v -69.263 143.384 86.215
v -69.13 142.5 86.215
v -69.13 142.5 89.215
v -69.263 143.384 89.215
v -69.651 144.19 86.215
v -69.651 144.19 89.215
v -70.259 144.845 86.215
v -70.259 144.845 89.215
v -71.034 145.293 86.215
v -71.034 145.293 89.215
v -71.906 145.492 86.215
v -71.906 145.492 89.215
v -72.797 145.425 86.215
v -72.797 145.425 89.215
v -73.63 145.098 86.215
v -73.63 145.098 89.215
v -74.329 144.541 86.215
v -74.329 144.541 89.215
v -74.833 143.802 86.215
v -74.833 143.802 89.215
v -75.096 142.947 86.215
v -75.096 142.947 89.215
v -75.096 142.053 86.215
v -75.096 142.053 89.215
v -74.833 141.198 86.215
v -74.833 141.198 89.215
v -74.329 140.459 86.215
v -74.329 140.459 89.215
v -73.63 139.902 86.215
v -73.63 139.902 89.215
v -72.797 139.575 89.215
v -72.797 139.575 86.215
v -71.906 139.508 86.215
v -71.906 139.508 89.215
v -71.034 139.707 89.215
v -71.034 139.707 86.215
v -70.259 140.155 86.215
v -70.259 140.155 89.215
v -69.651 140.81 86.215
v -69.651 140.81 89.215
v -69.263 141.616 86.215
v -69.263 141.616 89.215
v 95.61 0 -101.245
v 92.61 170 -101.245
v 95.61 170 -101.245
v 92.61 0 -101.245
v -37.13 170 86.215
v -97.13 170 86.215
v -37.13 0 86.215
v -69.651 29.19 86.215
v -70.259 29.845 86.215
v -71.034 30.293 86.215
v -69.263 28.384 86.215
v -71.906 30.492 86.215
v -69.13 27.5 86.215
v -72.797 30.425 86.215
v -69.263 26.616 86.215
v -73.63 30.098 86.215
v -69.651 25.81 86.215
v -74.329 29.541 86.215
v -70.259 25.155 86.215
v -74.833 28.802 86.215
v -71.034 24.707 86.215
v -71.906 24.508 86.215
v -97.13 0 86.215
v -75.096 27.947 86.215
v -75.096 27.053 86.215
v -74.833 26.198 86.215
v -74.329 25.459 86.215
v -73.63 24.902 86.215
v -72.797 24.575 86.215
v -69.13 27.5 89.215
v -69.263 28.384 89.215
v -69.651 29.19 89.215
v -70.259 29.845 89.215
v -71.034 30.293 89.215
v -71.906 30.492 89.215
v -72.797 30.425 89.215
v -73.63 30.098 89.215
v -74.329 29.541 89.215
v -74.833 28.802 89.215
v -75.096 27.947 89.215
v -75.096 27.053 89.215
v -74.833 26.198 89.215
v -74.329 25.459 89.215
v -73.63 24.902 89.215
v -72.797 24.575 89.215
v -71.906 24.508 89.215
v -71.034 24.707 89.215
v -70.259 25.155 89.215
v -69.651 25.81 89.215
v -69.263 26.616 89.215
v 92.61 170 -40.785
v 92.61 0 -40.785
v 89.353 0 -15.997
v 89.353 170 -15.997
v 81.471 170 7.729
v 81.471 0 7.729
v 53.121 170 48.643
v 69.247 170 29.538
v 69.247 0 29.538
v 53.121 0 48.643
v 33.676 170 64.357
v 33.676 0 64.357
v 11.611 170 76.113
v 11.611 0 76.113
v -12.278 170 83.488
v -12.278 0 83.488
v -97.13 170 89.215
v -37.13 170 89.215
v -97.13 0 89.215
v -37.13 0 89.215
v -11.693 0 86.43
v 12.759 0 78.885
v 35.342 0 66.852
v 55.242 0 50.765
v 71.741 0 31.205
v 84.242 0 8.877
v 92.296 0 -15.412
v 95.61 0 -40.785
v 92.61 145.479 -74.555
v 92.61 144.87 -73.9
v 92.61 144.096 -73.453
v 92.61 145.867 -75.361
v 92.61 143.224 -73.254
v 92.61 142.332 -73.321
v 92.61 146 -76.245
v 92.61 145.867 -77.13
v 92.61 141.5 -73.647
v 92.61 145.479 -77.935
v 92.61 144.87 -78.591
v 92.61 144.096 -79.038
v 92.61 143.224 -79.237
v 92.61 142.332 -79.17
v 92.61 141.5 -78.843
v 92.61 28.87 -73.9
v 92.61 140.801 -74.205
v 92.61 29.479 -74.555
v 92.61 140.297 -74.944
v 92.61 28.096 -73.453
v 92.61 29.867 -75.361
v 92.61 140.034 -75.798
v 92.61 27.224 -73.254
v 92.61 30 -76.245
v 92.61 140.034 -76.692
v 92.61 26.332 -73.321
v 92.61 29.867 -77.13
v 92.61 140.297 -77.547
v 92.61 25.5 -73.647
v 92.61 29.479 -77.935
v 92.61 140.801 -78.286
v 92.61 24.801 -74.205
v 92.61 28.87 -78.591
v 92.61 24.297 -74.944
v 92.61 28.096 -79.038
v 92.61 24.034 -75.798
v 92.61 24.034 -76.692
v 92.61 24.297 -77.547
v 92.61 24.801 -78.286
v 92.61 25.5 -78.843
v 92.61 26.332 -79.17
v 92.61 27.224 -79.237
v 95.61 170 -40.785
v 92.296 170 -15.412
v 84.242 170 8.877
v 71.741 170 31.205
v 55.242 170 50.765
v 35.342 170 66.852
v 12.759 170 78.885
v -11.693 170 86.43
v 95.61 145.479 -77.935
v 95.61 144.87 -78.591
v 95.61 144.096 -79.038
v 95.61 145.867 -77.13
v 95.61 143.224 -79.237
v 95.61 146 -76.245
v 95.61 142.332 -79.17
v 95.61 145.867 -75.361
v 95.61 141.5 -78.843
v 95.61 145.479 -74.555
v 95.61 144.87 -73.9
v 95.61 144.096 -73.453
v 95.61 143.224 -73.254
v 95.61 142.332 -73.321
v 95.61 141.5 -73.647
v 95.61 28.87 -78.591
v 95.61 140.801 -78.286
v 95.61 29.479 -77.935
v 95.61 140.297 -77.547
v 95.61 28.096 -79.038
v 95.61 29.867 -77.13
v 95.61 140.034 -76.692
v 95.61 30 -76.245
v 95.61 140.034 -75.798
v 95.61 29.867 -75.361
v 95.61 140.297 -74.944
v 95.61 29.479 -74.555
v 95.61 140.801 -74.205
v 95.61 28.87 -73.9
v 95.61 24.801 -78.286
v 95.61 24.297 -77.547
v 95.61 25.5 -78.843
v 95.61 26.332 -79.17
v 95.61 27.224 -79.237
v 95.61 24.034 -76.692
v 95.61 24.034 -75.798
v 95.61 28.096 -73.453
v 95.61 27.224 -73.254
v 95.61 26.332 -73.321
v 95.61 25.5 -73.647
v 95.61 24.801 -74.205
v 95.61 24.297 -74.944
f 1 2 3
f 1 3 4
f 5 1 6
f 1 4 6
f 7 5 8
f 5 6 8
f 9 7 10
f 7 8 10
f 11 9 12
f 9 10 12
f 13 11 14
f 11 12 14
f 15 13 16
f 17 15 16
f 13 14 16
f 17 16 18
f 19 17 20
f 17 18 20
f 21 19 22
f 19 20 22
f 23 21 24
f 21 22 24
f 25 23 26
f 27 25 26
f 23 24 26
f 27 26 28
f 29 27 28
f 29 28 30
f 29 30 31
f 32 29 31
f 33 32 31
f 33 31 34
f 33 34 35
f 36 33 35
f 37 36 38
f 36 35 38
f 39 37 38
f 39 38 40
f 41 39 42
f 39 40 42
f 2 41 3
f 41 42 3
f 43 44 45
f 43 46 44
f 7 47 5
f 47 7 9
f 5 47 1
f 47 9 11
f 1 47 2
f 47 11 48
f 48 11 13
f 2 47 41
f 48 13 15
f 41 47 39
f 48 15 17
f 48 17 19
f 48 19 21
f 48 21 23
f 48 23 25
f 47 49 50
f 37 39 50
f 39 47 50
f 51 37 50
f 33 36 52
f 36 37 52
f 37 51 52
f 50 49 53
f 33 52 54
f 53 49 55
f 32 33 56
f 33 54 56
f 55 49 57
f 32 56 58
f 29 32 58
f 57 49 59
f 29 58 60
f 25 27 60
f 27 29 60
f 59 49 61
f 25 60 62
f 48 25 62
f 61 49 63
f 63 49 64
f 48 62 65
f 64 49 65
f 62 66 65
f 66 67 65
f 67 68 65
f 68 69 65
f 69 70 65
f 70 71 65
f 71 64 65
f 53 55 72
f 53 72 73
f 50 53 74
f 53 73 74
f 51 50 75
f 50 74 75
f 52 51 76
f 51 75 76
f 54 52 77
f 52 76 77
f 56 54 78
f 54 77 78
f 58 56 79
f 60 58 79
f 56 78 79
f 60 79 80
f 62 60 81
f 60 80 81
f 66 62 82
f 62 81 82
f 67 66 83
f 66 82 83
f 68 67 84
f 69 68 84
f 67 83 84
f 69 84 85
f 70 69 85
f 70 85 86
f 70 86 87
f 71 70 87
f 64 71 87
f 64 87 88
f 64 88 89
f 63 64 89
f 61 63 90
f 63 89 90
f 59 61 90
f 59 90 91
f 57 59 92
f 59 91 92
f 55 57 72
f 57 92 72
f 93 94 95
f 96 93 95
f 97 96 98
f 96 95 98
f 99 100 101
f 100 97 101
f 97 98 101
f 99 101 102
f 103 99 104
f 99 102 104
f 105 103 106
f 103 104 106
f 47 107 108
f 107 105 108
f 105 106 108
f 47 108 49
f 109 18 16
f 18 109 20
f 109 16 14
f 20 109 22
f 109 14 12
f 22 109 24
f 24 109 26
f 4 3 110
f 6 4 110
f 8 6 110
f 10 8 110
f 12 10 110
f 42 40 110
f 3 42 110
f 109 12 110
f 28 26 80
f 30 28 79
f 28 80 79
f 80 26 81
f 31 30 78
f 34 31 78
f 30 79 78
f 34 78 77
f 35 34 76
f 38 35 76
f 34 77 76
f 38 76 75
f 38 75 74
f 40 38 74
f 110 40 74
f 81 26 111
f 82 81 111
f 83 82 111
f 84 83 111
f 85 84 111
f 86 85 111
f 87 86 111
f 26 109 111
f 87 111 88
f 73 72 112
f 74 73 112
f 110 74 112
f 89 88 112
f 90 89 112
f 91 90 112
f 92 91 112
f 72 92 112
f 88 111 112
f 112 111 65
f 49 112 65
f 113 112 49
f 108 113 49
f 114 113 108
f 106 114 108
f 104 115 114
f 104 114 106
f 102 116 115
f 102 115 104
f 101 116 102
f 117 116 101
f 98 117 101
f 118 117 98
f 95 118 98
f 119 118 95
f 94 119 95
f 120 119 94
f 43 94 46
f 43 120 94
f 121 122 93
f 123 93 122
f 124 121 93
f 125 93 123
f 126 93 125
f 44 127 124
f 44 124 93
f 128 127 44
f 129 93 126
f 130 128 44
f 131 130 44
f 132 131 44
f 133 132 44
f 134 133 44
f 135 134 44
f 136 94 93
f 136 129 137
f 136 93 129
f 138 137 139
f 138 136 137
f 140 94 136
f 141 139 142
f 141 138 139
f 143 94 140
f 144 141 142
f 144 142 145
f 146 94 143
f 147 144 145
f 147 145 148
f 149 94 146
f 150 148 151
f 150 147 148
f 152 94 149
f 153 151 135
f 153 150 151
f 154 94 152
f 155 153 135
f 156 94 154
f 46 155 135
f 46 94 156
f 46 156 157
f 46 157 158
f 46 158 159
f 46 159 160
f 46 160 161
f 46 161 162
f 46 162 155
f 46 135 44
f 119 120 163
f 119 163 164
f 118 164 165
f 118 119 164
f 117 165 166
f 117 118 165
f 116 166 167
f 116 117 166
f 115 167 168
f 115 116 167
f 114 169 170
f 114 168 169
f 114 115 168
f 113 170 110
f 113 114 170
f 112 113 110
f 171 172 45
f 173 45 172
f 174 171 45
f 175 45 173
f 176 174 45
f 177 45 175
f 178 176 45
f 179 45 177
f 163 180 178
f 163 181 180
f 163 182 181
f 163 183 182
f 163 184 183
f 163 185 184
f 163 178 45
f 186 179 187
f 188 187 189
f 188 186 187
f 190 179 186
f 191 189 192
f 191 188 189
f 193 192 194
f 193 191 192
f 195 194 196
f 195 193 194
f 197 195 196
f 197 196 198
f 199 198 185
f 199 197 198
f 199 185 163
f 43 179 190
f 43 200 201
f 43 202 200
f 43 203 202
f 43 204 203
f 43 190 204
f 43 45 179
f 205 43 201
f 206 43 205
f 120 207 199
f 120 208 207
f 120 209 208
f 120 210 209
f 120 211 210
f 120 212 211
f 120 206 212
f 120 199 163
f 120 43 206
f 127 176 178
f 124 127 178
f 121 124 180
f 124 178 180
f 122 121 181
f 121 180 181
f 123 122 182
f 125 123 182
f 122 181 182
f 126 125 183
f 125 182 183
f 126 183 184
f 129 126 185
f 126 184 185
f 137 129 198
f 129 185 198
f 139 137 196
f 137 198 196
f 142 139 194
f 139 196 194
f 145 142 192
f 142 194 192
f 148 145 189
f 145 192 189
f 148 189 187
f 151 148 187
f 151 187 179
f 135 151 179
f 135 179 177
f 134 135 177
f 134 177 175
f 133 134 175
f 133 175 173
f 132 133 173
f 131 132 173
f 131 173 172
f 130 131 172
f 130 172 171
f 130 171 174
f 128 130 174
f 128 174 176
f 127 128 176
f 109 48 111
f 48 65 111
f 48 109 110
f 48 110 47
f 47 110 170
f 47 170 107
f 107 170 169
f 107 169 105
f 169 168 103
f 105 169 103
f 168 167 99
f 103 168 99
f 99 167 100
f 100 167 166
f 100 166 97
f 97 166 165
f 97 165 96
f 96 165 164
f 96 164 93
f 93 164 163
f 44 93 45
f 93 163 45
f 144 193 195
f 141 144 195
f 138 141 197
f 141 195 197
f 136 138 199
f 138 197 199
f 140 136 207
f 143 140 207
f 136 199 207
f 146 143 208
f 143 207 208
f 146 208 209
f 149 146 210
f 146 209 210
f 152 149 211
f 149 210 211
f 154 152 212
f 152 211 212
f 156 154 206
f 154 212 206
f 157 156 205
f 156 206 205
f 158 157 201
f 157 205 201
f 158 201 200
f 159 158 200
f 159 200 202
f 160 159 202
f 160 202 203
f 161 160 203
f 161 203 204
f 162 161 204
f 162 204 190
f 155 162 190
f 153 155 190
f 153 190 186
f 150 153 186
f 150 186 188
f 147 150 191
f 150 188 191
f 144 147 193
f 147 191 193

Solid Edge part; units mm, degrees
sketch "Sketch1" plane through (0, 0, 0) normal (0, -1, 0) x (1, 0, 0)
  arc A0 (-37.1299, 86.2147) -> (92.6101, -40.7853) centre (-39.0034, -45.4688) cw
  line L0 (92.6101, -40.7853) -> (92.6101, -101.2453)
  line L1 (92.6101, -101.2453) -> (95.6101, -101.2453)
  line L2 (95.6101, -101.2453) -> (95.6101, -40.7853)
  arc A1 (-37.1299, 89.2147) -> (95.6101, -40.7853) centre (-39.0019, -45.4657) cw
  line L3 (-97.1299, 89.2147) -> (-37.1299, 89.2147)
  line L4 (-97.1299, 86.2147) -> (-97.1299, 89.2147)
  line L5 (-37.1299, 86.2147) -> (-97.1299, 86.2147)
  dimension "D1" = 129.74
  dimension "D2" = 127
  dimension "D3" = 60
  dimension "D4" = 60.46
  dimension "D5" = 3
  dimension "D6" = 3
  dimension "D7" = 3
extrude "Protrusion1" add sketch "Sketch1" against normal blind 170
sketch "Sketch2" plane through (-67.1299, 85, 89.2147) normal (0, 0, 1) x (1, 0, 0)
  circle A0 centre (-5, 57.5) radius 3
  circle A1 centre (-5, -57.5) radius 3
  dimension "D1" = 25
  dimension "D2" = 6
  dimension "D3" = 115
extrude "Cutout1" cut sketch "Sketch2" against normal through all
sketch "Sketch3" plane through (95.6101, 85, -66.0153) normal (1, 0, 0) x (0, 1, 0)
  circle A0 centre (58, -10.23) radius 3
  circle A1 centre (-58, -10.23) radius 3
  dimension "D1" = 116
  dimension "D2" = 6
  dimension "D3" = 6
  dimension "D4" = 25
extrude "Cutout2" cut sketch "Sketch3" against normal through all
properties material "Nylon, allgemein"
